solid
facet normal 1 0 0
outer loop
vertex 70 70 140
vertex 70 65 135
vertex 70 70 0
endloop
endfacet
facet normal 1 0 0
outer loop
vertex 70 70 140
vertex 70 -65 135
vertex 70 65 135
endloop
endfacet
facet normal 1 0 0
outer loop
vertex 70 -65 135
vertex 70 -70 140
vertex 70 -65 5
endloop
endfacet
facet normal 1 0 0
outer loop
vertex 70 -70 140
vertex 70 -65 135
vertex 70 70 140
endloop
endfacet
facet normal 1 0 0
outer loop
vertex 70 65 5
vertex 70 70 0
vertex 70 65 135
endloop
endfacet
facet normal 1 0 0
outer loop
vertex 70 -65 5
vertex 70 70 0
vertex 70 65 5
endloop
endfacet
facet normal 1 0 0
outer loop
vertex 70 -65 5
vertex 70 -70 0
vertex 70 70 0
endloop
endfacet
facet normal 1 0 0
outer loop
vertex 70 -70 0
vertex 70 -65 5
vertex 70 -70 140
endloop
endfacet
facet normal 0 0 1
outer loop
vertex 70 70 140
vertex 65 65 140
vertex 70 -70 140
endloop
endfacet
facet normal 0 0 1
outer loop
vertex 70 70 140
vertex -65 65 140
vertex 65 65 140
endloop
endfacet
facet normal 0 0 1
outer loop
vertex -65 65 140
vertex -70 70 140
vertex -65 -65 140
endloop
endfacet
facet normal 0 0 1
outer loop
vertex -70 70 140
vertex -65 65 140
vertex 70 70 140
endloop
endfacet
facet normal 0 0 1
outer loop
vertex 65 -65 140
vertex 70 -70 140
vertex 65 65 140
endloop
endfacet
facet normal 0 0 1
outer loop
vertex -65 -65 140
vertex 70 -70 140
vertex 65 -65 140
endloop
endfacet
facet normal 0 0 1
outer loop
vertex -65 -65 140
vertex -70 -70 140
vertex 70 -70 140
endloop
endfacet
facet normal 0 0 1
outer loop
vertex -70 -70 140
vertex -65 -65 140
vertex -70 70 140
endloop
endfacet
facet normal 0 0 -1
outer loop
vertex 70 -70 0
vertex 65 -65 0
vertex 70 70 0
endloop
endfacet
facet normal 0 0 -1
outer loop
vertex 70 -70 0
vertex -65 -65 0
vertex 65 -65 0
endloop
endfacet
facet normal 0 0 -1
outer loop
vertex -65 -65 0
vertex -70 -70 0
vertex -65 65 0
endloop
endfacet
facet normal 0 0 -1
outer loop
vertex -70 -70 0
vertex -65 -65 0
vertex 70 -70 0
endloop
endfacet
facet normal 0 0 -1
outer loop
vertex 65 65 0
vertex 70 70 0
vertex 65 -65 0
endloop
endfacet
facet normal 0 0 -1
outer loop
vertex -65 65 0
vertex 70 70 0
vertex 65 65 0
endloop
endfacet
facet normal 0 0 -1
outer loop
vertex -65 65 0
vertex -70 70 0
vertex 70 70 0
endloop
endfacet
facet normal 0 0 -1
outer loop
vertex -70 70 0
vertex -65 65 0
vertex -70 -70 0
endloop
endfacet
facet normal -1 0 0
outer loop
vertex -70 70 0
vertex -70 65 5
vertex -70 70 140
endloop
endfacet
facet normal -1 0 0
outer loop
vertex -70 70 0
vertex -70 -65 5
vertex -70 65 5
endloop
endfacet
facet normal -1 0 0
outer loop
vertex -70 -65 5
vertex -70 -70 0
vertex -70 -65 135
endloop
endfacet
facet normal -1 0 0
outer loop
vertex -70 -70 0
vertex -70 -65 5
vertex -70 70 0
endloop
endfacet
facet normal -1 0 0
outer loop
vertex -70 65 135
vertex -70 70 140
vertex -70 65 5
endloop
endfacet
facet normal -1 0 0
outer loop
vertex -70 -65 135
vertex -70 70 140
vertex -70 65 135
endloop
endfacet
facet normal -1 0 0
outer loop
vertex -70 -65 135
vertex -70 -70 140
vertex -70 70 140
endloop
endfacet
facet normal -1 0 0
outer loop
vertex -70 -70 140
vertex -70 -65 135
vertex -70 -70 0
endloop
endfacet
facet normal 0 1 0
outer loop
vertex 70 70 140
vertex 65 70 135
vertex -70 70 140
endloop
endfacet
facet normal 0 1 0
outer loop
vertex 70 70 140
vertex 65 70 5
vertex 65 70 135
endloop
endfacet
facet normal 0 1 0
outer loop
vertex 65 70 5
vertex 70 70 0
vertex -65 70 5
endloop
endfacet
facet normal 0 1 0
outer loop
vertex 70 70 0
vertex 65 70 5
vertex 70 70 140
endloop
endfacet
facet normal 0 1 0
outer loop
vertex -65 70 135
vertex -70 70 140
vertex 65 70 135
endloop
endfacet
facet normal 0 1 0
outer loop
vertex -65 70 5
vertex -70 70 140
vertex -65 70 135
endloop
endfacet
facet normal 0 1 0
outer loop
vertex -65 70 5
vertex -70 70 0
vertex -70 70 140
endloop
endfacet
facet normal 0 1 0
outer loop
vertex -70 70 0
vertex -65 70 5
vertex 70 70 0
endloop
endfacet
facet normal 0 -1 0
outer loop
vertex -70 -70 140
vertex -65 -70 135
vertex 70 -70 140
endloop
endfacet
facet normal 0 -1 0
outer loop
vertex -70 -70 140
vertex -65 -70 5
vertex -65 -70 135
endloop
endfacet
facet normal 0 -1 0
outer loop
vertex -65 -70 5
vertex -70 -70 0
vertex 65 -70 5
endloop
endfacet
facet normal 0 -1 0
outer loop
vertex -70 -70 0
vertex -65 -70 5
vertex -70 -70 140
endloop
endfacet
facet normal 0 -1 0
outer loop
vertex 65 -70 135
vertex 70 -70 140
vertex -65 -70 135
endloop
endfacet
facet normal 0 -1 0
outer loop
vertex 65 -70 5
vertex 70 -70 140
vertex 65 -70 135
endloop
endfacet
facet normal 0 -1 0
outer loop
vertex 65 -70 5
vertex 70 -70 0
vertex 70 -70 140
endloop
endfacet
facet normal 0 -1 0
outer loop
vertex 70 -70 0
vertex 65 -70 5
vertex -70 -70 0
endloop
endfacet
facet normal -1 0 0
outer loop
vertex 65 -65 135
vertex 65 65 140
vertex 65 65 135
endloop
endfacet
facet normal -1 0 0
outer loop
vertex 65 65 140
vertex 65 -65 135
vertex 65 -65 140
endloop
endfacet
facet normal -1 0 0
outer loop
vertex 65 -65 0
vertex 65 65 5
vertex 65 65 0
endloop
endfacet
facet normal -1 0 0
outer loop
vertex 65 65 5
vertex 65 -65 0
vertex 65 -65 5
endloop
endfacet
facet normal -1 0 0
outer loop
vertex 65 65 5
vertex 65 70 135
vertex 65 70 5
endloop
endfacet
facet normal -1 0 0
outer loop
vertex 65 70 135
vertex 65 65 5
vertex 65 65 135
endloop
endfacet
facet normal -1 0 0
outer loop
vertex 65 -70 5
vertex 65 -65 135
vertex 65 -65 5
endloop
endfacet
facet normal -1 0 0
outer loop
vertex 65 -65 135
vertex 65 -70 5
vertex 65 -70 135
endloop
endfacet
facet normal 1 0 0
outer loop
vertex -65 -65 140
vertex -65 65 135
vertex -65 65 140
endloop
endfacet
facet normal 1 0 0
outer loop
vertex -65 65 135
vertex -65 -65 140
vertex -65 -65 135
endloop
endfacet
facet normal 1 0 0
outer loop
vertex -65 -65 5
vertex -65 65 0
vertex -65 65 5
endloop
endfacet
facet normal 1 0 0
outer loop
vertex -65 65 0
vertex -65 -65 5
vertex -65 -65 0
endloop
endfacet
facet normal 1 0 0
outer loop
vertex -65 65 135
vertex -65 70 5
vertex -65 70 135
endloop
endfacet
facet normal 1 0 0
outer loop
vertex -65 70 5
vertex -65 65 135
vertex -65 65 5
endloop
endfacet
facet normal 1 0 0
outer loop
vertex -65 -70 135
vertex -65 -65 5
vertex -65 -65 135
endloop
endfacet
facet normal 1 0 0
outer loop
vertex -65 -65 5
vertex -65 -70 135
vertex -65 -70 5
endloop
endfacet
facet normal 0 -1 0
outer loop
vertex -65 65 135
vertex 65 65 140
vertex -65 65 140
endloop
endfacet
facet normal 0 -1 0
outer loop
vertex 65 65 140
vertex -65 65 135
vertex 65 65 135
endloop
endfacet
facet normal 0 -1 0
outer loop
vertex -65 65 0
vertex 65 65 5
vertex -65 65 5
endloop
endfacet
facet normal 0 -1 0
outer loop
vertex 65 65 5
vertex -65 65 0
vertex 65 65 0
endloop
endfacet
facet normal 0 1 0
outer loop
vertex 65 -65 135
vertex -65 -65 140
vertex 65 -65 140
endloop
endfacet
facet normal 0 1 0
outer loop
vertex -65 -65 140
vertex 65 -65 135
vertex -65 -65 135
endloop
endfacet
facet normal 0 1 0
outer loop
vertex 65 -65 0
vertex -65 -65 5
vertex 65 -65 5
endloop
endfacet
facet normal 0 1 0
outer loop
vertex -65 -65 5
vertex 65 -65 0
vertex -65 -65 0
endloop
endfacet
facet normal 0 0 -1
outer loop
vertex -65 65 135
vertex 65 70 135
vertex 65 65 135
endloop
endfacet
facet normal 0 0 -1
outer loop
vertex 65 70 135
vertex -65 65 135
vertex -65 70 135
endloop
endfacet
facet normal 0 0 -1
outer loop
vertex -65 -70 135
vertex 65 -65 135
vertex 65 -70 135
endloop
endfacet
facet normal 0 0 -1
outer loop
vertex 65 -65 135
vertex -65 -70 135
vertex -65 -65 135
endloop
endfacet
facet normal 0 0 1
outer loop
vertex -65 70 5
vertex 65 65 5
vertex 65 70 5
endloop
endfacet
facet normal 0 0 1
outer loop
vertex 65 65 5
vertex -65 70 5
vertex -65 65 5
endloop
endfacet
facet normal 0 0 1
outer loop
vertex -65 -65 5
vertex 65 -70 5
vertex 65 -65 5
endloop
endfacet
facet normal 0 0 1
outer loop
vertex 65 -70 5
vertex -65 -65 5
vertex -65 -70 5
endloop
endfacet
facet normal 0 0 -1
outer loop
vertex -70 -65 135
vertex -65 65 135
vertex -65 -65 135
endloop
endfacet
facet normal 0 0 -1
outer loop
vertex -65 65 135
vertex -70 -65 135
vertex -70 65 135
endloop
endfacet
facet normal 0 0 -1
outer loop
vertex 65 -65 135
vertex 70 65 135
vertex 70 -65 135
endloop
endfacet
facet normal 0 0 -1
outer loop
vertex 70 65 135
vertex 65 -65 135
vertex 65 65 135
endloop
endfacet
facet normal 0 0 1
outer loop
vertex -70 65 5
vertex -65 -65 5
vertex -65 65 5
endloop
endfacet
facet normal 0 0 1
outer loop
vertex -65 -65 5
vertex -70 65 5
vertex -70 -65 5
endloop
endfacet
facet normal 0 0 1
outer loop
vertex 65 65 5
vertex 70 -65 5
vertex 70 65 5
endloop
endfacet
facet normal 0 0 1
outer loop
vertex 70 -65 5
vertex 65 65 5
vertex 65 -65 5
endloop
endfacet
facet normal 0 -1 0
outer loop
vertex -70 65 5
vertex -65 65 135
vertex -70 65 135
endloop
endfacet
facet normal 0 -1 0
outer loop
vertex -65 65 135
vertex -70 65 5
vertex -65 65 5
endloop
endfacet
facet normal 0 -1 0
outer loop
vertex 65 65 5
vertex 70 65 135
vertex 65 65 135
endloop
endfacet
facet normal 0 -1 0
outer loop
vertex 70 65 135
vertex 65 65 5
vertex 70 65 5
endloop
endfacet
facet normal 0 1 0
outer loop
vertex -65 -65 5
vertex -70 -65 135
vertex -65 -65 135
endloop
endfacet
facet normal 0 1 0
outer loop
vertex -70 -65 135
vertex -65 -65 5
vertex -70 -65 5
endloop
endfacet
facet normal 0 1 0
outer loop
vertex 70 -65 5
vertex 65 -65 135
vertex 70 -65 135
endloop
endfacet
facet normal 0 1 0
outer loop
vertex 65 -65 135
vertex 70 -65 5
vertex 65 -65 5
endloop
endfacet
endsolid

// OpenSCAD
// file: config.scad
size= 140;
radius = size/2;
framewidth = 5;
bowlradius = radius-framewidth;
borderwidth = 0.8;
$fa=2;
$fs=2;
// main file
include <config.scad>

module bylassen_frame(size, framewidth, candle = false) {
    radius = size/2;
    translate([radius*-1,radius*-1,0]) {
        difference () {
            cube(size);
            translate([framewidth,framewidth,-1]) {
                cube([size-framewidth*2, size-framewidth*2, size+2]);
            }
            translate([framewidth,-1,framewidth]) {
                cube([size-framewidth*2, size+2, size-framewidth*2]);
            }
            translate([-1, framewidth,framewidth]) {
                cube([size+2, size-framewidth*2, size-framewidth*2]);
            }
            if (candle) {
                translate([-1, framewidth,-1]) {
                    cube([size+2, size-framewidth*2, size-framewidth*2]);
                }
            }
        }
    }
}
bylassen_frame(size, framewidth);
